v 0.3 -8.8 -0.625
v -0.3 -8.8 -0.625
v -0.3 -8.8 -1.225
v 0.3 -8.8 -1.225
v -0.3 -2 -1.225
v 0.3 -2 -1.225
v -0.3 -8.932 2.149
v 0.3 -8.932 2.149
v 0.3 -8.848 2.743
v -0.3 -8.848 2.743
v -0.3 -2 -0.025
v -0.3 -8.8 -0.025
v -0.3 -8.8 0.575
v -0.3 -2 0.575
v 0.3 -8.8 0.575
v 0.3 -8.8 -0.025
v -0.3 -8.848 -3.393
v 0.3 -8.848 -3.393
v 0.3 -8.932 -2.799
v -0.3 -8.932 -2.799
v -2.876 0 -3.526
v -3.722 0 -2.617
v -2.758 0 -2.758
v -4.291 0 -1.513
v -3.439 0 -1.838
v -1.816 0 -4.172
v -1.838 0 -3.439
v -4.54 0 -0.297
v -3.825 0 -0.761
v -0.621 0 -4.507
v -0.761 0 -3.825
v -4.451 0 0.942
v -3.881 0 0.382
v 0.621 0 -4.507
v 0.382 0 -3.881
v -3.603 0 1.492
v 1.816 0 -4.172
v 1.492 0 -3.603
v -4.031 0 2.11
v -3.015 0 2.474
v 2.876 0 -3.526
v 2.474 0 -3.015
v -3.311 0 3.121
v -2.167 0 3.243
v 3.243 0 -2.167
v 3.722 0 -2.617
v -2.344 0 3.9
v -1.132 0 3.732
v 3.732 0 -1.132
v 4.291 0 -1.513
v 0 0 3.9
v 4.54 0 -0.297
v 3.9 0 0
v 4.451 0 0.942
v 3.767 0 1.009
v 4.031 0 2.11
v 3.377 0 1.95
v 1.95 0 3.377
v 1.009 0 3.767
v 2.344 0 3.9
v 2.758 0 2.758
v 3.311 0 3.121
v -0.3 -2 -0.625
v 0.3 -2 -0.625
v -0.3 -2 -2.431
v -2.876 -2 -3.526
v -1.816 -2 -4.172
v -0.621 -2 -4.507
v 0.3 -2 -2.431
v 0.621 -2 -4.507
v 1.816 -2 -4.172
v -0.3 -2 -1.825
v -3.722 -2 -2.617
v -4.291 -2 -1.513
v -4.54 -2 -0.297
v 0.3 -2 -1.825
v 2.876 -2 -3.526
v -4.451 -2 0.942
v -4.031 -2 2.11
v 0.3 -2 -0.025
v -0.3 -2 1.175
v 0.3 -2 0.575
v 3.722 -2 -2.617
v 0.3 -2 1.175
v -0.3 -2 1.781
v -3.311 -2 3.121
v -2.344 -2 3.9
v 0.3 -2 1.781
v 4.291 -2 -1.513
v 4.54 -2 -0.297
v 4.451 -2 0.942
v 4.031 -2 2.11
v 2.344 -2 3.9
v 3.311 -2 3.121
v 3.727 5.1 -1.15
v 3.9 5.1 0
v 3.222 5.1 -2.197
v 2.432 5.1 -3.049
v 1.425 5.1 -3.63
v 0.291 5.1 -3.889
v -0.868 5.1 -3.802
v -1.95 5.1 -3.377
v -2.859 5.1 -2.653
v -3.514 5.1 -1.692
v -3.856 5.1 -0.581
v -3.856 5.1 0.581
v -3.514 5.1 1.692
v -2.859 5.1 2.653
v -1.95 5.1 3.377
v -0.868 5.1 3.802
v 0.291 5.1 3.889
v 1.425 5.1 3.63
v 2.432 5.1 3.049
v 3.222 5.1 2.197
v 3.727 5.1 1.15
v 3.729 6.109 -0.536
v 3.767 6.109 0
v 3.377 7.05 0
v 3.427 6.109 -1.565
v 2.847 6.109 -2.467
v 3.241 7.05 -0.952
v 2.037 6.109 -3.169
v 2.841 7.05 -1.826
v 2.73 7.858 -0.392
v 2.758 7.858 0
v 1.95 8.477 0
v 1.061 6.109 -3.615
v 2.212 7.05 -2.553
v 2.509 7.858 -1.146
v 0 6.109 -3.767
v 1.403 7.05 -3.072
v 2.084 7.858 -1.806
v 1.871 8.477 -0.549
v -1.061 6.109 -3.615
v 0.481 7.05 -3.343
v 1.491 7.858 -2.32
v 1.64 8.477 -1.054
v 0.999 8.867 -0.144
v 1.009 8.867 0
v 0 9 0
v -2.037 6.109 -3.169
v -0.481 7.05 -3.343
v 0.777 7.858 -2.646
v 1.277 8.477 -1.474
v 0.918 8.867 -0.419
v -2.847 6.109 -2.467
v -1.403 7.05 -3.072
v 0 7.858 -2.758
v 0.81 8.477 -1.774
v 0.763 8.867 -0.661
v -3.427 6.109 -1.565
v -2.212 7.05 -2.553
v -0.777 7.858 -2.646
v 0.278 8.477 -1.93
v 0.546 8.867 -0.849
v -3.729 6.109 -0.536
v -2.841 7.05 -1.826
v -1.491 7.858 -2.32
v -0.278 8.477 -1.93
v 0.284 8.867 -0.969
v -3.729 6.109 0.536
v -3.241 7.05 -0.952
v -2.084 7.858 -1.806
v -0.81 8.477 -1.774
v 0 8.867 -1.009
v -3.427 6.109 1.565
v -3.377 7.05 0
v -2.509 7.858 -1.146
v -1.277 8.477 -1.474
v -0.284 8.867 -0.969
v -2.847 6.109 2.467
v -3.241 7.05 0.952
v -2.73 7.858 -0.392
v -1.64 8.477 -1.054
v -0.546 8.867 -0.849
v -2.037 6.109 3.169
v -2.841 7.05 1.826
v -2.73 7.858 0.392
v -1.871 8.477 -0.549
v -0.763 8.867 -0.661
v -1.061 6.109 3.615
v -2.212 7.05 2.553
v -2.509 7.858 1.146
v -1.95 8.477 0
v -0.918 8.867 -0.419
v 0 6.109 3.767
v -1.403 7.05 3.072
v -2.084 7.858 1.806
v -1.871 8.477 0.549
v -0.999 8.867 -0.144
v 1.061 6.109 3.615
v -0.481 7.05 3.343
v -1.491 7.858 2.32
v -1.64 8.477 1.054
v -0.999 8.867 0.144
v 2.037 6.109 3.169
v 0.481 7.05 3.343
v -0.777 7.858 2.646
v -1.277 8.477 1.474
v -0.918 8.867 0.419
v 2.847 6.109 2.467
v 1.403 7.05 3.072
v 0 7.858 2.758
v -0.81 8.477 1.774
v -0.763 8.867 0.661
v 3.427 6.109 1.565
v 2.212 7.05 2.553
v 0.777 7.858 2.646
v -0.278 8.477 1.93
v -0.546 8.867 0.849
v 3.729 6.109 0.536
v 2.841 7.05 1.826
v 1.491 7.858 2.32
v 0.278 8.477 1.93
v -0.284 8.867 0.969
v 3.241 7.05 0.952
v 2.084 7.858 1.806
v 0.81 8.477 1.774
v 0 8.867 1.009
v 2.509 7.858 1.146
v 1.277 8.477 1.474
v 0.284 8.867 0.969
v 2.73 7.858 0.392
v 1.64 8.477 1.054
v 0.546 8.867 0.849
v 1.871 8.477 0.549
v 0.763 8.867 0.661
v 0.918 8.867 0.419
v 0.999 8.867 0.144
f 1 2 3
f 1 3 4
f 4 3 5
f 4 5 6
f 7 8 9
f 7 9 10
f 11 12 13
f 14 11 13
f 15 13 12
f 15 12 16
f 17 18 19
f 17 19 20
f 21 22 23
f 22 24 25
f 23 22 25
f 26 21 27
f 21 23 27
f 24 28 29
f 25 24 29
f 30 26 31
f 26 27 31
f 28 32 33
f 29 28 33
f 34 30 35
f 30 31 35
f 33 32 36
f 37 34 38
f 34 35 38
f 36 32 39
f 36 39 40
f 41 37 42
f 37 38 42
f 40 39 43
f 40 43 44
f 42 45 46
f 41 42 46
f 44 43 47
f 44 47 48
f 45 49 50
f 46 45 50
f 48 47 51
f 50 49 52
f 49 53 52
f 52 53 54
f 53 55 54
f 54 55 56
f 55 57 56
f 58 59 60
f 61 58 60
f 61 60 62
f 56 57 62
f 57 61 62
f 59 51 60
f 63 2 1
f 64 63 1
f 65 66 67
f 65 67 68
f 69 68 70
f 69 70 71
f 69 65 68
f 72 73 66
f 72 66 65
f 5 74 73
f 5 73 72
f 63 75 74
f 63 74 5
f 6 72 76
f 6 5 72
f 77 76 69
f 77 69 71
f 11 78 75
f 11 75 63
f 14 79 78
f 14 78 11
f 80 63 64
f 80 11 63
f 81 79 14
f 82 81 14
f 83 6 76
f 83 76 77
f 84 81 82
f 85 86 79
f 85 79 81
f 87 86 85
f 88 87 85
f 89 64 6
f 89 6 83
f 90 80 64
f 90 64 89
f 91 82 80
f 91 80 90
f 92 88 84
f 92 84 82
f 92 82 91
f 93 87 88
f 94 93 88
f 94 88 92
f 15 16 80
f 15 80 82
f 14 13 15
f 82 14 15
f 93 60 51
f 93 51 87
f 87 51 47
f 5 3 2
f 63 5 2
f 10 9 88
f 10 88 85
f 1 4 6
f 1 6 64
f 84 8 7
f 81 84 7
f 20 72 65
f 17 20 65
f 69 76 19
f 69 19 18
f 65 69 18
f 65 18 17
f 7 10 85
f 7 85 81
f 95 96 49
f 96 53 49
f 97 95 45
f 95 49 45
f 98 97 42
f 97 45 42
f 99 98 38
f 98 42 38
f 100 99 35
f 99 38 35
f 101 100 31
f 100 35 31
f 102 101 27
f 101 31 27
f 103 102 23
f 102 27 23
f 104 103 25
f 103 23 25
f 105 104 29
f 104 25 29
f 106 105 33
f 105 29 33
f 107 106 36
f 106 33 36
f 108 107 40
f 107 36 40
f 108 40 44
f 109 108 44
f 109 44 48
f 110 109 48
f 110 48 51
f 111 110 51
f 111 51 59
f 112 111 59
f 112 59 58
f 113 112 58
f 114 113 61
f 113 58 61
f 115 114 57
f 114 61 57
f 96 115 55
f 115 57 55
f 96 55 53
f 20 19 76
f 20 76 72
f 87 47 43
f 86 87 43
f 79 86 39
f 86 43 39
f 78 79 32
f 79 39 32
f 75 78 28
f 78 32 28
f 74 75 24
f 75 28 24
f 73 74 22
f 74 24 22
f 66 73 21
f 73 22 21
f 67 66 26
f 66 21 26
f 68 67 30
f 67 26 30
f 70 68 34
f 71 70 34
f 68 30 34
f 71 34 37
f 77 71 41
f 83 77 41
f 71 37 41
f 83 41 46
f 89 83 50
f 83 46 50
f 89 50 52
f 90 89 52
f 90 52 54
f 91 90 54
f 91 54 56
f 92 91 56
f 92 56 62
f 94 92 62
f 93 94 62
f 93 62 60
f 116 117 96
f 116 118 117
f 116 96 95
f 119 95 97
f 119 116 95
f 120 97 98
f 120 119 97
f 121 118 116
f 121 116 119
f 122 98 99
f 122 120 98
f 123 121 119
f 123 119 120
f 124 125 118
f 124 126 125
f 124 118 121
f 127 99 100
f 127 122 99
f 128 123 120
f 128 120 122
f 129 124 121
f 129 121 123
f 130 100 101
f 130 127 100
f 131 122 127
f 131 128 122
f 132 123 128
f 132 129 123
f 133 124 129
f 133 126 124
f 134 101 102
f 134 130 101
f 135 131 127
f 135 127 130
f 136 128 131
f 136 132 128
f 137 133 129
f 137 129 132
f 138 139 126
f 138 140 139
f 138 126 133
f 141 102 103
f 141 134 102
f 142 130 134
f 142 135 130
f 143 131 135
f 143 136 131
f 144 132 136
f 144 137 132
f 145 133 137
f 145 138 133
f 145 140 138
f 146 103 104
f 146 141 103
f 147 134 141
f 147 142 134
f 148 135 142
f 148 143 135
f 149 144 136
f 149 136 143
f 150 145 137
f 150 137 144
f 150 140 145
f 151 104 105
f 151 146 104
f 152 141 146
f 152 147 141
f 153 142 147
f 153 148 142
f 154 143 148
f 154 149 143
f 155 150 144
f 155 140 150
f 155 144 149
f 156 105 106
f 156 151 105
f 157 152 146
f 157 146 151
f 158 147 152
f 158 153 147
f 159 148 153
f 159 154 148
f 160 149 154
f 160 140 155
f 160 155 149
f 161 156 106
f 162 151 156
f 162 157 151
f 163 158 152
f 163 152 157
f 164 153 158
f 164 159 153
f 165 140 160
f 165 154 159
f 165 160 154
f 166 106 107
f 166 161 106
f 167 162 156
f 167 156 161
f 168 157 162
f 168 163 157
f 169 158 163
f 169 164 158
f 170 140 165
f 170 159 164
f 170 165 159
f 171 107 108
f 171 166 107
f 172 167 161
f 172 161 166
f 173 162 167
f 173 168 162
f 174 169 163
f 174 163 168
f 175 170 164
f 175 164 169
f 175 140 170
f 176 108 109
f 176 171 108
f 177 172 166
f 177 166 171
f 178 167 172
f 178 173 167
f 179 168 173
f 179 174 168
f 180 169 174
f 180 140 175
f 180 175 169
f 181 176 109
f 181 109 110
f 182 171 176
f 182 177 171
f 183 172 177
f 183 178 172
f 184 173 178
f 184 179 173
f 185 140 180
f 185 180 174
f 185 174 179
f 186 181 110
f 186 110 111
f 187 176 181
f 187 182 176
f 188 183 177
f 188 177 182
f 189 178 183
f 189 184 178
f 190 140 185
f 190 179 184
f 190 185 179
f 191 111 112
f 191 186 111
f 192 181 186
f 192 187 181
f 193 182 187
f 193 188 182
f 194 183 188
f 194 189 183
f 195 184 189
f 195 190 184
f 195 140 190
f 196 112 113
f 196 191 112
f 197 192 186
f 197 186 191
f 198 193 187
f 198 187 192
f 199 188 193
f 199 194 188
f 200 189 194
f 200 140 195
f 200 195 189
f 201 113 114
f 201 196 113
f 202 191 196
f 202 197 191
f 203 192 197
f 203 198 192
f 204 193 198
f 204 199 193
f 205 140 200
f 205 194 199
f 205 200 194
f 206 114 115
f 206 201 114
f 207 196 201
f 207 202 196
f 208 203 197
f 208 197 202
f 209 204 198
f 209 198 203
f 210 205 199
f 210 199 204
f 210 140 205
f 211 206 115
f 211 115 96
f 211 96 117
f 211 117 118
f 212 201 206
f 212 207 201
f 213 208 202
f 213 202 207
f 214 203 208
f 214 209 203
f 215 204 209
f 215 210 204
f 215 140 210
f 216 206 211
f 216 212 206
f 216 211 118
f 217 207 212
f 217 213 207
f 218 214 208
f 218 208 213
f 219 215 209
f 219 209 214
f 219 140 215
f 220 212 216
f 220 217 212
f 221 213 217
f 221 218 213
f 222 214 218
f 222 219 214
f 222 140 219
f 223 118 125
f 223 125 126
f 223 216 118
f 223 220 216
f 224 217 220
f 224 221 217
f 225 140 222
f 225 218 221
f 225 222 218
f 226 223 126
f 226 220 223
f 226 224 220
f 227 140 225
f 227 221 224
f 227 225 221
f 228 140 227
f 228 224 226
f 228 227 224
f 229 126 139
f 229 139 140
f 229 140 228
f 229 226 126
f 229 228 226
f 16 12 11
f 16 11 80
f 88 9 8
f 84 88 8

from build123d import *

# Parameters (mm, degrees)
ESQUISSE1_R        = 3.9
BOSS_EXTRU_1_DEPTH = 9
CONG_1_R           = 3.9
BOSS_EXTRU_2_DEPTH = 2
ESQUISSE3_W        = 0.6
ESQUISSE3_H        = 0.6
BOSS_EXTRU_3_DEPTH = 6.8
ESQUISSE6_W        = 0.6
ESQUISSE6_H        = 0.6
BOSS_EXTRU_4_DEPTH = 7
ESQUISSE8_W        = 0.6
ESQUISSE8_H        = 0.6
BOSS_EXTRU_5_DEPTH = 7


with BuildPart() as part:
    # Esquisse1 → Boss.-Extru.1 (new body)
    with BuildSketch(Plane(origin=(0, 0, 0), x_dir=(1, 0, 0), z_dir=(0, 1, 0))):
        Circle(ESQUISSE1_R)
    extrude(amount=BOSS_EXTRU_1_DEPTH)

    # Congé1
    cong_1_edges = [part.edges().sort_by_distance(p)[0] for p in [
        (-3.9, 9, 0),
    ]]
    fillet(cong_1_edges, radius=CONG_1_R)

    # Esquisse2 → Boss.-Extru.2 (add)
    with BuildSketch(Plane.XZ):
        with BuildLine():
            Line((2.343608329, 3.9), (-2.343608329, 3.9))
            ThreePointArc((-2.343608329, 3.9), (0, -4.55), (2.343608329, 3.9))
        make_face()
    extrude(amount=BOSS_EXTRU_2_DEPTH)

    # Esquisse3 → Boss.-Extru.3 (add)
    with BuildSketch(Plane.XZ.offset(2)):
        with Locations((0, 0.275)):
            Rectangle(ESQUISSE3_W, ESQUISSE3_H)
        with Locations((0, -0.925)):
            Rectangle(ESQUISSE3_W, ESQUISSE3_H)
    extrude(amount=BOSS_EXTRU_3_DEPTH)

    # Esquisse6 → Boss.-Extru.4 (add)
    with BuildSketch(Plane(origin=(0, -2.123198642, 0.298396109), x_dir=(-1, 0, 0), z_dir=(0, -0.990268069, 0.139173101))):
        with Locations((0, -1.185218779)):
            Rectangle(ESQUISSE6_W, ESQUISSE6_H)
    extrude(amount=BOSS_EXTRU_4_DEPTH)

    # Esquisse8 → Boss.-Extru.5 (add)
    with BuildSketch(Plane(origin=(0, -2.212780783, -0.310986058), x_dir=(-1, 0, 0), z_dir=(0, -0.990268069, -0.139173101))):
        with Locations((0, 1.828893024)):
            Rectangle(ESQUISSE8_W, ESQUISSE8_H)
    extrude(amount=BOSS_EXTRU_5_DEPTH)


solid = part.part
